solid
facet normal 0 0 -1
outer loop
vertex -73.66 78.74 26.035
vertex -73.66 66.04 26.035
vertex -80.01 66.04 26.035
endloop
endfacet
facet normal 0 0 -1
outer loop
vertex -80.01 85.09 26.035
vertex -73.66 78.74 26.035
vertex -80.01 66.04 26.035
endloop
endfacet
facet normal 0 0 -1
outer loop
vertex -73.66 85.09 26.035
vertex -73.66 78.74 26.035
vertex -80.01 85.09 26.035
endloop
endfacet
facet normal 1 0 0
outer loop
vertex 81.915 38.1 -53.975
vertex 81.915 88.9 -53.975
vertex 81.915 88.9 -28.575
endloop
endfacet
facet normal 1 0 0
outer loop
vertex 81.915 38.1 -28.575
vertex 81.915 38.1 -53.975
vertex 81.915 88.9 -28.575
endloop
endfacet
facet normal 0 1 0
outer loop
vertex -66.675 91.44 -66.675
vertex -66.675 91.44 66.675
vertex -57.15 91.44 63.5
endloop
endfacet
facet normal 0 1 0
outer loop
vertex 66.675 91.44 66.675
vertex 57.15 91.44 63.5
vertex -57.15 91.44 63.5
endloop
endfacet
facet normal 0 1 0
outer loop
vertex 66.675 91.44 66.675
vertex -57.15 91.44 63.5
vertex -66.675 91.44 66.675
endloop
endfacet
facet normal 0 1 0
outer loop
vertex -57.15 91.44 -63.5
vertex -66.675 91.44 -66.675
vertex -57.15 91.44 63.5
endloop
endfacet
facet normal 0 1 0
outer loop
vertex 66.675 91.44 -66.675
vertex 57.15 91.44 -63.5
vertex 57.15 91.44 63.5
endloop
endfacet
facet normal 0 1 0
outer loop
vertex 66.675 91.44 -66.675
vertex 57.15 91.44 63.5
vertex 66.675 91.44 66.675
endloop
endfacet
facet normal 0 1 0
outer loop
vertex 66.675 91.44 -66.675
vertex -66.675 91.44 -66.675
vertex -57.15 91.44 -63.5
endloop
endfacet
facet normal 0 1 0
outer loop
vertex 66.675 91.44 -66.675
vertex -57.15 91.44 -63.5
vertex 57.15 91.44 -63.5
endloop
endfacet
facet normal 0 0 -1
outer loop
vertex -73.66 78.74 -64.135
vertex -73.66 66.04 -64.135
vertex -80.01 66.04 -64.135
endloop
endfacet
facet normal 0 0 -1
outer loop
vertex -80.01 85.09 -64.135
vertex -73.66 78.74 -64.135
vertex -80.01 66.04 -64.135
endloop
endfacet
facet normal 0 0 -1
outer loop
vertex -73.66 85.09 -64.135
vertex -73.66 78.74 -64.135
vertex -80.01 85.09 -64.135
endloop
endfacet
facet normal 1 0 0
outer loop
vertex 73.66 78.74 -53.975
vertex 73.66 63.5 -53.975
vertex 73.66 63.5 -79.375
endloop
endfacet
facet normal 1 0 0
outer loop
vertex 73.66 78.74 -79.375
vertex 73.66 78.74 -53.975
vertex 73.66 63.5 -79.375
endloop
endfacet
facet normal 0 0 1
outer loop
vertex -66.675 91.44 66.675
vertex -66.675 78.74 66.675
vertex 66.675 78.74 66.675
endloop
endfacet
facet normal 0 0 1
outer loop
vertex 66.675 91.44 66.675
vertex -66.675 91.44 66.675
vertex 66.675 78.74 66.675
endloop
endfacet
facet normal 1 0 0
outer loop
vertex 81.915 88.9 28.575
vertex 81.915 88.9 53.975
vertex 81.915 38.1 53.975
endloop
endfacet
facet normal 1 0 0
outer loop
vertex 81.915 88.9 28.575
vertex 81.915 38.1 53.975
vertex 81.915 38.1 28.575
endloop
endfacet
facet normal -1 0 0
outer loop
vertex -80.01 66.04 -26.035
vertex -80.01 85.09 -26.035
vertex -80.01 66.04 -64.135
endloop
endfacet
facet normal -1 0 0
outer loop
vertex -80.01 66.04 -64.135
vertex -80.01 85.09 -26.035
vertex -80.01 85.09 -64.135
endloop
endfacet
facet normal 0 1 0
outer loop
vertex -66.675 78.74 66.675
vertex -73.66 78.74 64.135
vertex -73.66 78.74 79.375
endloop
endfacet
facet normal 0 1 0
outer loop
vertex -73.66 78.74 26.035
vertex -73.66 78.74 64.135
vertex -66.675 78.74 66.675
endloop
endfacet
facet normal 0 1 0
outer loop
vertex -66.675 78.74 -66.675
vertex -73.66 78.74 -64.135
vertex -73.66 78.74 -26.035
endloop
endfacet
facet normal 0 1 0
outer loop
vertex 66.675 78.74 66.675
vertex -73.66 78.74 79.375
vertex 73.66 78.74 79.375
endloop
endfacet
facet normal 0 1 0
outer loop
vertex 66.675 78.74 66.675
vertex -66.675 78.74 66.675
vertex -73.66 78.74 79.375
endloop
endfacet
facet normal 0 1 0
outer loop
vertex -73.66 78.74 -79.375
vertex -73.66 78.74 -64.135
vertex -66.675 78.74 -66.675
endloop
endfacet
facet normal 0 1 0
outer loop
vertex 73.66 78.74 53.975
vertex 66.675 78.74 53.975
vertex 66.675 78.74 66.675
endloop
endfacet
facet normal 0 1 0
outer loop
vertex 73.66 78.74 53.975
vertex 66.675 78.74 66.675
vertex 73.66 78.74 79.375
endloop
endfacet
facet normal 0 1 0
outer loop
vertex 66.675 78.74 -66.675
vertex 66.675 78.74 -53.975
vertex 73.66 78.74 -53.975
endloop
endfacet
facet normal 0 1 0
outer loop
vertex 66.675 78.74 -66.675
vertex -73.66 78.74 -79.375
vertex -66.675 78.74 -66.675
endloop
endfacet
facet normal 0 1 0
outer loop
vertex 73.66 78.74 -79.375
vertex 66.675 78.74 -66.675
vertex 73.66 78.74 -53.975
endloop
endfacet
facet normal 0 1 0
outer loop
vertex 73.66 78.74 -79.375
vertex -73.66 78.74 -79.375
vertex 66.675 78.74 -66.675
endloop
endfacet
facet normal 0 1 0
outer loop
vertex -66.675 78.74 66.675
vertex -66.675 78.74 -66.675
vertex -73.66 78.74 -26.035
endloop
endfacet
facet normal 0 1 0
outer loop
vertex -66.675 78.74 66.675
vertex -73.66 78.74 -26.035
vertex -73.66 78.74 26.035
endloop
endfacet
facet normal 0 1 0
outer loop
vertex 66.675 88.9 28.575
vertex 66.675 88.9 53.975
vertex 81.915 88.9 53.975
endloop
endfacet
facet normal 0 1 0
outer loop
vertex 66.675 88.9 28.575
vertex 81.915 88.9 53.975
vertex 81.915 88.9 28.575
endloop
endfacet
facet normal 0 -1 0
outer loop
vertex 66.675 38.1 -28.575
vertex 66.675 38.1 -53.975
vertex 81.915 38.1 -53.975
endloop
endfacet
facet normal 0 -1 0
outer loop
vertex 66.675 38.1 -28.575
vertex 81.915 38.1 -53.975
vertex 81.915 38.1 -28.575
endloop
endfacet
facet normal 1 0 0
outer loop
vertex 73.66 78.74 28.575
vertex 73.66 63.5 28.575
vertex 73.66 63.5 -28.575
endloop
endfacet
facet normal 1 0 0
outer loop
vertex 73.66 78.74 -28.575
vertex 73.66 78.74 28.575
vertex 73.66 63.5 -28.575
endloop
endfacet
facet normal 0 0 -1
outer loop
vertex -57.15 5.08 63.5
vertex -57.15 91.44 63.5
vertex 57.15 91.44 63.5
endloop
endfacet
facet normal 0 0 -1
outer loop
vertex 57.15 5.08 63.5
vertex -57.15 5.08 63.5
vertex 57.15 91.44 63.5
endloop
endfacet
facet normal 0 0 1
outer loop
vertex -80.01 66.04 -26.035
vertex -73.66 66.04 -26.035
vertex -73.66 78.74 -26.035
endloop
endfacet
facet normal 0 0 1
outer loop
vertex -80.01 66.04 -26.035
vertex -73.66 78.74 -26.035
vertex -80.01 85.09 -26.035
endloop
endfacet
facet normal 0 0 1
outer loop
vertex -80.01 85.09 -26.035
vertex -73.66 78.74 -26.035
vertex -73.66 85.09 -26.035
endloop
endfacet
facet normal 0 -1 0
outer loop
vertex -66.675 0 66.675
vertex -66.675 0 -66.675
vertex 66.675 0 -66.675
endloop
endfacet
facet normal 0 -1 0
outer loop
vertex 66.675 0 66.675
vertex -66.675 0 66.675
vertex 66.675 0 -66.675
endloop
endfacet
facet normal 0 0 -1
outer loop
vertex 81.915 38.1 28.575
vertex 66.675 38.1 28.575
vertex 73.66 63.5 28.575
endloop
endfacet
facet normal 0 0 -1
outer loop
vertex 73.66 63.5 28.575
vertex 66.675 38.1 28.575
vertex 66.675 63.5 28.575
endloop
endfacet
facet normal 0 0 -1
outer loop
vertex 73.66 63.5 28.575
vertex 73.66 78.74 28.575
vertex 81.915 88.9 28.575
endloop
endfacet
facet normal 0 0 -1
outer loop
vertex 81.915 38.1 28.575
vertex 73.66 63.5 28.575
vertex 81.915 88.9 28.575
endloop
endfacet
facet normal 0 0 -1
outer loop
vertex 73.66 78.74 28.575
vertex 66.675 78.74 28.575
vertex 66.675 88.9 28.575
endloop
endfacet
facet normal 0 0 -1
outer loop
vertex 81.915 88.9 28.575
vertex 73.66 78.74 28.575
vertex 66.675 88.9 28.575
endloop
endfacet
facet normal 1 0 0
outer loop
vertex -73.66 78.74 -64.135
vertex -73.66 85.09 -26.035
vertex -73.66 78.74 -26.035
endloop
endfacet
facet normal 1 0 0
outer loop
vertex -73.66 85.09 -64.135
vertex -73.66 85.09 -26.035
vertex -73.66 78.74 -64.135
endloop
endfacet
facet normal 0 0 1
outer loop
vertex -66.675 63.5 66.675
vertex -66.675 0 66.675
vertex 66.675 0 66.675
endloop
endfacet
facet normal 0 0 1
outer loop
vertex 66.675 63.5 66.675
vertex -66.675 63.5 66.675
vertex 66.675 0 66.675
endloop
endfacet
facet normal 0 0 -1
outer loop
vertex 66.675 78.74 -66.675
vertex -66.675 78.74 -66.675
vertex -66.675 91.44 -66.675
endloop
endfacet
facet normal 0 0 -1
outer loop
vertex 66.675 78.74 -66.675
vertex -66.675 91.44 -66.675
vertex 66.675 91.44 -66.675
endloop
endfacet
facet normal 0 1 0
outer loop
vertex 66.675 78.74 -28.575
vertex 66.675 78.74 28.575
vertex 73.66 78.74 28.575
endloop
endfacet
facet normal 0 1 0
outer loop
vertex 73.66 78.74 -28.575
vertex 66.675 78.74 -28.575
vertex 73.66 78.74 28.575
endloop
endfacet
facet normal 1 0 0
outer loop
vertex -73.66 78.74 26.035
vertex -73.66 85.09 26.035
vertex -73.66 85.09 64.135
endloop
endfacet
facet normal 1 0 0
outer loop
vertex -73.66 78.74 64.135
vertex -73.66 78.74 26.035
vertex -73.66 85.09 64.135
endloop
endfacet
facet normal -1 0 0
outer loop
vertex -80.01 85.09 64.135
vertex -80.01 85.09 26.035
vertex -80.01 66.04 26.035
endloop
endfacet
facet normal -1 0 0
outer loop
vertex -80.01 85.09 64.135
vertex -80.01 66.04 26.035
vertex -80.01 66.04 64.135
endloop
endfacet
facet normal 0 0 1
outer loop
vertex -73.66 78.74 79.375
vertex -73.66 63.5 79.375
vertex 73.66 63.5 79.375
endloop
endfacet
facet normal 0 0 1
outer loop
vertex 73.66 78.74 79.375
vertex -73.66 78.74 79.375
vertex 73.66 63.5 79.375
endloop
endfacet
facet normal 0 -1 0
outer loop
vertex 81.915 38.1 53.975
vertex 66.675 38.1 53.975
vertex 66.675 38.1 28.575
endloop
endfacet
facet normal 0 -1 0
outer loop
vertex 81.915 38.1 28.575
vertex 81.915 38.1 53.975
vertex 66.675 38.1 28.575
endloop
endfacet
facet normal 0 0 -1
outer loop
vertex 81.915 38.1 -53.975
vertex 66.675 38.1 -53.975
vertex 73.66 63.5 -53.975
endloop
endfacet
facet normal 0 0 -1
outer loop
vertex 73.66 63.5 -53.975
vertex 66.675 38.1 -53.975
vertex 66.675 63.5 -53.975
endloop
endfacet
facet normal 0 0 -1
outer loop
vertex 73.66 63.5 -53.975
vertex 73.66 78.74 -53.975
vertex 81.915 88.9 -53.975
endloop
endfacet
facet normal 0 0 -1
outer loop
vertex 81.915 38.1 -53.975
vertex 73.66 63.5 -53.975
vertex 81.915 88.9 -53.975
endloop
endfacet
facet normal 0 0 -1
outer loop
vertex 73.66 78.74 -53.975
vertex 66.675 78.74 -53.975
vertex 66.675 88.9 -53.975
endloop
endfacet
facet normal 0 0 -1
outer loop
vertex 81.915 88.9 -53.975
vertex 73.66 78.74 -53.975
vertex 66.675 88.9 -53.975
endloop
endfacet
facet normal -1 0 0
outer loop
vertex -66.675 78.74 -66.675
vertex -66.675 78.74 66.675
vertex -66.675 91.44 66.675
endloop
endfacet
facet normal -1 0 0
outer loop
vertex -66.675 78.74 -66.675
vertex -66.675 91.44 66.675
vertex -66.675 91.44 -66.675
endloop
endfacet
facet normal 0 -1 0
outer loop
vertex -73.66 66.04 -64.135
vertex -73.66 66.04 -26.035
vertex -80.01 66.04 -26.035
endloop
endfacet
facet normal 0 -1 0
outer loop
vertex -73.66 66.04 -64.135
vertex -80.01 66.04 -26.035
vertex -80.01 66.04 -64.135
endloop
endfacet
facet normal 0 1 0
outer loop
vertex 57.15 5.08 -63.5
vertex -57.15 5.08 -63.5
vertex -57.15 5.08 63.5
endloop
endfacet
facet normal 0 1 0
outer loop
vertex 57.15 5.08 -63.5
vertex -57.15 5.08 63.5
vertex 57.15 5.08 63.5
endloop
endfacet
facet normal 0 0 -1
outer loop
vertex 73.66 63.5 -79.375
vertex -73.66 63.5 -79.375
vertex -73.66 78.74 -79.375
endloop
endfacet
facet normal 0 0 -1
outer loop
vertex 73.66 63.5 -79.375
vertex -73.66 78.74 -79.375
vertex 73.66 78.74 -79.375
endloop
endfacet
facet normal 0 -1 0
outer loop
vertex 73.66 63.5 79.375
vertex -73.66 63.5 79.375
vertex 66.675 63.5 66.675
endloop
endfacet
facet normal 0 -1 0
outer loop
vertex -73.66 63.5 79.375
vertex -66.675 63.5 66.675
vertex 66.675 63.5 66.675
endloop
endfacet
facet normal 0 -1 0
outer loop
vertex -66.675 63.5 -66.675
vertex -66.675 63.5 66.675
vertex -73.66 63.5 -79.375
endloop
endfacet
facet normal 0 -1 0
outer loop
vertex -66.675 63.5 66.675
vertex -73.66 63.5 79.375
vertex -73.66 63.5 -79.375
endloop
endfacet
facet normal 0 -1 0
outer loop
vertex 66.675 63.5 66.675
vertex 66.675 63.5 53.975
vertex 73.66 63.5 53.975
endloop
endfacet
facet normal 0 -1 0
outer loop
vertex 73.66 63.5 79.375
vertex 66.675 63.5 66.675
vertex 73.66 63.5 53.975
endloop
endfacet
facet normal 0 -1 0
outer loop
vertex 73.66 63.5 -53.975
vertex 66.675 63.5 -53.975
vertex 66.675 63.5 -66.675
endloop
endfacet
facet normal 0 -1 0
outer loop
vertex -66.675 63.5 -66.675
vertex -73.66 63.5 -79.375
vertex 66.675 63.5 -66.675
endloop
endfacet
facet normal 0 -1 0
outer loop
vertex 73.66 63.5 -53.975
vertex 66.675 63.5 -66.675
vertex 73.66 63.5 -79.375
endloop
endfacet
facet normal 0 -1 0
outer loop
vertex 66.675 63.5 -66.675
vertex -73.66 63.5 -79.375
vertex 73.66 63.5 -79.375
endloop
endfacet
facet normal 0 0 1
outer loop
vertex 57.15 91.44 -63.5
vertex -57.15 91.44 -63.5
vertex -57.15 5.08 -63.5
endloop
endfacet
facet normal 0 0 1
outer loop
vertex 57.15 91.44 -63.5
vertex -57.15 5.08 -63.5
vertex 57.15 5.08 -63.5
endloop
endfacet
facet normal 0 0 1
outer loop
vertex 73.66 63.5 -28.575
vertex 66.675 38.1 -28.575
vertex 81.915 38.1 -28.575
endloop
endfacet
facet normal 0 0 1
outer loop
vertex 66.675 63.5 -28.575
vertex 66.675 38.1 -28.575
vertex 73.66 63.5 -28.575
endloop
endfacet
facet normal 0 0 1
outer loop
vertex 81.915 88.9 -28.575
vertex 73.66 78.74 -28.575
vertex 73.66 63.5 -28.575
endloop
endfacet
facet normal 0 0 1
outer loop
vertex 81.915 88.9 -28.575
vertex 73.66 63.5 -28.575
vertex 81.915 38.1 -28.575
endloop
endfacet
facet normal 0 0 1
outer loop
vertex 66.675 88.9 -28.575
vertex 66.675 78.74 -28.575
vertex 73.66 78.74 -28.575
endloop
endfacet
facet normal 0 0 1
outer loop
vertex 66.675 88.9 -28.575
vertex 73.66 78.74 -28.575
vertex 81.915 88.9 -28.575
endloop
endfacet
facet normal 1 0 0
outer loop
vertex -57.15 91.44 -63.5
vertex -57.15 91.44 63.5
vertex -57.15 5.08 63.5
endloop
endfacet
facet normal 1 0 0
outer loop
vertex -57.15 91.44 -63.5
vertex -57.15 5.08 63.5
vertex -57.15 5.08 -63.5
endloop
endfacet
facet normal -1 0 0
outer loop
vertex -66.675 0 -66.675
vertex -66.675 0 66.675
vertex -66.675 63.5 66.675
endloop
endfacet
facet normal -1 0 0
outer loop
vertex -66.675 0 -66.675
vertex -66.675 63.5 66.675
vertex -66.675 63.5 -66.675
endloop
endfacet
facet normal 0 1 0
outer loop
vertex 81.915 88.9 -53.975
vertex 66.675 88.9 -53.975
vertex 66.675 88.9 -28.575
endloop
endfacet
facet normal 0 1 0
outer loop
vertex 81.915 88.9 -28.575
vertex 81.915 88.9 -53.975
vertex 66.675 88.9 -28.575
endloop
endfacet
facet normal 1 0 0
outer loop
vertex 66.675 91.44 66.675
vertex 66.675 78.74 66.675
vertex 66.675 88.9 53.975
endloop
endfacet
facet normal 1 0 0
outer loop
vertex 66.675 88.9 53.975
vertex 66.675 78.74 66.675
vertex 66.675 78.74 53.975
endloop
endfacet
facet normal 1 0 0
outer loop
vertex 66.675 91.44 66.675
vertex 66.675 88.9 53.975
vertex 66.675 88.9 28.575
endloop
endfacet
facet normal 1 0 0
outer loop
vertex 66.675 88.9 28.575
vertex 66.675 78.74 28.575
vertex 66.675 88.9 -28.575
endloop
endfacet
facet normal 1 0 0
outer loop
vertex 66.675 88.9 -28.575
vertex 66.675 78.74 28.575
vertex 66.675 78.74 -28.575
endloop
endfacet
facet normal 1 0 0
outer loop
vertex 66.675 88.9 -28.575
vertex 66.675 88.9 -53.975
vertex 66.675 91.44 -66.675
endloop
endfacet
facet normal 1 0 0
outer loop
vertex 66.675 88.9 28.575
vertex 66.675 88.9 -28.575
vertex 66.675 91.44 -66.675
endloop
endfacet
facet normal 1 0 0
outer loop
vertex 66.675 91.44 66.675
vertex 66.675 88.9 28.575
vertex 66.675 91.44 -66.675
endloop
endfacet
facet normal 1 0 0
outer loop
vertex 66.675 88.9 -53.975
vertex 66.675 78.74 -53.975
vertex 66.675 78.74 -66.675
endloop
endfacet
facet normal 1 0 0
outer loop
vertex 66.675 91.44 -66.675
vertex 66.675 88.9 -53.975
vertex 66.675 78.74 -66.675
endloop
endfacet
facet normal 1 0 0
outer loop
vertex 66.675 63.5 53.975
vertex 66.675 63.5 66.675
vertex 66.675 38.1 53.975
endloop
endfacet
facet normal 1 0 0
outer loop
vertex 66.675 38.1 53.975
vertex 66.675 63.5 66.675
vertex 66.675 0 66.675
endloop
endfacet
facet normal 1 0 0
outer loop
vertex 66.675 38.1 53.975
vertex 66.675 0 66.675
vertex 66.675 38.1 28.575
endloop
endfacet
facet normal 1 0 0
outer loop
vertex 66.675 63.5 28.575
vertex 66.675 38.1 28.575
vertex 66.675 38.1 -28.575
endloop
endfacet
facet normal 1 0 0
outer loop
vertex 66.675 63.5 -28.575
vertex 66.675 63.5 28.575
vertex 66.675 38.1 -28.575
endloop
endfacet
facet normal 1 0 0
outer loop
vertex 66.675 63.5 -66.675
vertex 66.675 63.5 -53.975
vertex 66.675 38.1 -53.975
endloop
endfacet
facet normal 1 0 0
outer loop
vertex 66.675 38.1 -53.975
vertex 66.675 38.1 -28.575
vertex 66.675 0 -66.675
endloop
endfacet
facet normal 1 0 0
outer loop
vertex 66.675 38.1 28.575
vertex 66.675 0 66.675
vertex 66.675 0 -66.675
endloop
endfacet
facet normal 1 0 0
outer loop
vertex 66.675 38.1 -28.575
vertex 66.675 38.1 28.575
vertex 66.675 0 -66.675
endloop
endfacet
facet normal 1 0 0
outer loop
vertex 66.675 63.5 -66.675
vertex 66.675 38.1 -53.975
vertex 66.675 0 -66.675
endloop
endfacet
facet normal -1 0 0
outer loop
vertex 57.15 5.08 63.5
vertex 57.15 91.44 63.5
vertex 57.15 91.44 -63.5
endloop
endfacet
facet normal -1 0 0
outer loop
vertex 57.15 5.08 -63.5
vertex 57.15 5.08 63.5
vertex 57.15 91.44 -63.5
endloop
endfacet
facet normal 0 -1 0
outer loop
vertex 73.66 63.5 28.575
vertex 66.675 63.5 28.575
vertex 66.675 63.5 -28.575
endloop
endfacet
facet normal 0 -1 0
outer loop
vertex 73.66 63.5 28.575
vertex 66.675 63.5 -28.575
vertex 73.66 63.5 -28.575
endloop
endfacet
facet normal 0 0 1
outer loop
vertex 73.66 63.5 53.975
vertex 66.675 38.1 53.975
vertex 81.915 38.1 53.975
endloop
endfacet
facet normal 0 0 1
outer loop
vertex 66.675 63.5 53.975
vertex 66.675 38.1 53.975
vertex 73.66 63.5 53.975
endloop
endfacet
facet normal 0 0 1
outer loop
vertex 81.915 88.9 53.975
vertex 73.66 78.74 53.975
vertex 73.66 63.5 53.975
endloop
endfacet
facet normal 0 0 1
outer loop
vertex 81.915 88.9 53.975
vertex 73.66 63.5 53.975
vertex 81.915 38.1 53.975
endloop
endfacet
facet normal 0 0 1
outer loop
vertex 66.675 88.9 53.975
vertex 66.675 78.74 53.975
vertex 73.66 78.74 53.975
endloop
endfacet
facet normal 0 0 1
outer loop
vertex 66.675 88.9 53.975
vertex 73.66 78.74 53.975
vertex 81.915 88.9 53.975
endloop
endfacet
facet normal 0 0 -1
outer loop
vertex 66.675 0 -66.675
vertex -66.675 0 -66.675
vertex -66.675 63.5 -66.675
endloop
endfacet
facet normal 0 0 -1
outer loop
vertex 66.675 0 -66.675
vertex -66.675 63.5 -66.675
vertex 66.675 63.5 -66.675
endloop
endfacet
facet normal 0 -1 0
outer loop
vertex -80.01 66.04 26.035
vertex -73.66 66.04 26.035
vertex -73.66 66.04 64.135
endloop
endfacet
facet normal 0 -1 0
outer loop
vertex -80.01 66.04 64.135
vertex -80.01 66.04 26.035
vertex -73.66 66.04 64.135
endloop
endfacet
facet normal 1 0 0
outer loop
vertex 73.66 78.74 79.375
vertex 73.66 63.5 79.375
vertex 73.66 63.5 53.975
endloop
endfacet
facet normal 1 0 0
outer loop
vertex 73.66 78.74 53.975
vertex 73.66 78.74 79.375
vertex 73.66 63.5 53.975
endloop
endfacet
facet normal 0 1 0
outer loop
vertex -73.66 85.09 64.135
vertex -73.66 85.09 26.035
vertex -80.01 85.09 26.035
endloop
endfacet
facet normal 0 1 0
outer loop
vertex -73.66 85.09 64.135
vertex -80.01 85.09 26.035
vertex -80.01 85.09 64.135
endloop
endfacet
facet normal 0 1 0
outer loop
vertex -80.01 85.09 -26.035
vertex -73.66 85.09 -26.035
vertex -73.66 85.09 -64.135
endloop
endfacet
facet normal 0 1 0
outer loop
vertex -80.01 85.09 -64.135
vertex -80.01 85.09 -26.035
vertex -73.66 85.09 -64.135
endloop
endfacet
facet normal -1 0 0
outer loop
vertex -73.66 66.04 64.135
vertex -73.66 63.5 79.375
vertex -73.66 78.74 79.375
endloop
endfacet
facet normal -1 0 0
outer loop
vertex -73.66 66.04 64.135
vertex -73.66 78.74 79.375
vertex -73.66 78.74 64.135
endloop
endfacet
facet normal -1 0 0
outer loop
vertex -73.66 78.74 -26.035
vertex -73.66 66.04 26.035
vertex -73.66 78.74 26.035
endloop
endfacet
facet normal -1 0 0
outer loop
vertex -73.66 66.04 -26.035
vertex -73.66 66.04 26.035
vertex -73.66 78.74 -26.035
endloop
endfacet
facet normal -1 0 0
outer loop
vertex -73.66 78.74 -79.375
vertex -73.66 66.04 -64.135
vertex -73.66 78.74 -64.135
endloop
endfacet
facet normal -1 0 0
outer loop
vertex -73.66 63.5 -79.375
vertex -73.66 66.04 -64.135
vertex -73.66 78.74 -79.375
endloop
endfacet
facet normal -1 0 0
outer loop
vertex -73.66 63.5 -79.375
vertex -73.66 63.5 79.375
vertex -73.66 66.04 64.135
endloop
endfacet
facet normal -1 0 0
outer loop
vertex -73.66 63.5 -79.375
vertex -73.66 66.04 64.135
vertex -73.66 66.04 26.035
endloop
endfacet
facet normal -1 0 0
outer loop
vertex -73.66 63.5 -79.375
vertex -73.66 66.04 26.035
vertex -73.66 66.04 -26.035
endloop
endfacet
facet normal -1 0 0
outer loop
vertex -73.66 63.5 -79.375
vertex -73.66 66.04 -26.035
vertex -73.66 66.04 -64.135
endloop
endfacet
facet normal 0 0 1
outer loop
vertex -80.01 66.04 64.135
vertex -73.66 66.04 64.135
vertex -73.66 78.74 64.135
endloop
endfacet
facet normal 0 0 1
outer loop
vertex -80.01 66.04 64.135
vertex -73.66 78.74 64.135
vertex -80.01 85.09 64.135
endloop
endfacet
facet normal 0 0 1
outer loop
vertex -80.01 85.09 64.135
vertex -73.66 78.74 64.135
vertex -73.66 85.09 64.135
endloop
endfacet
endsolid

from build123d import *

# Parameters (mm, degrees)
SKETCH1_W           = 133.35
SKETCH1_H           = 133.35
BOSS_EXTRUDE1_DEPTH = 63.5
SKETCH2_W           = 147.32
SKETCH2_H           = 158.75
BOSS_EXTRUDE2_DEPTH = 15.24
SKETCH3_W           = 133.35
SKETCH3_H           = 133.35
BOSS_EXTRUDE3_DEPTH = 12.7
SKETCH4_W           = 38.1
SKETCH4_H           = 19.05
BOSS_EXTRUDE4_DEPTH = 6.35
SKETCH5_W           = 25.4
SKETCH5_H           = 50.8
BOSS_EXTRUDE5_DEPTH = 15.24
SKETCH7_W           = 114.3
SKETCH7_H           = 127
CUT_EXTRUDE1_DEPTH  = 86.36


with BuildPart() as part:
    # Sketch1 → Boss-Extrude1 (new body)
    with BuildSketch(Plane(origin=(0, 0, 0), x_dir=(1, 0, 0), z_dir=(0, 1, 0))):
        Rectangle(SKETCH1_W, SKETCH1_H)
    extrude(amount=BOSS_EXTRUDE1_DEPTH)

    # Sketch2 → Boss-Extrude2 (add)
    with BuildSketch(Plane(origin=(0, 63.5, 0), x_dir=(1, 0, 0), z_dir=(0, 1, 0))):
        Rectangle(SKETCH2_W, SKETCH2_H)
    extrude(amount=BOSS_EXTRUDE2_DEPTH)

    # Sketch3 → Boss-Extrude3 (add)
    with BuildSketch(Plane(origin=(0, 78.74, 0), x_dir=(1, 0, 0), z_dir=(0, 1, 0))):
        Rectangle(SKETCH3_W, SKETCH3_H)
    extrude(amount=BOSS_EXTRUDE3_DEPTH)

    # Sketch4 → Boss-Extrude4 (add)
    with BuildSketch(Plane.ZY.offset(73.66)):
        with Locations((45.085, 75.565)):
            Rectangle(SKETCH4_W, SKETCH4_H)
    boss_extrude4 = extrude(amount=BOSS_EXTRUDE4_DEPTH)

    # Mirror1: Boss-Extrude4 across plane
    add(boss_extrude4.mirror(Plane.XY))

    # Sketch5 → Boss-Extrude5 (add)
    with BuildSketch(Plane(origin=(66.675, 0, 0), x_dir=(0, 0, -1), z_dir=(1, 0, 0))):
        with Locations((-41.275, 63.5)):
            Rectangle(SKETCH5_W, SKETCH5_H)
    boss_extrude5 = extrude(amount=BOSS_EXTRUDE5_DEPTH)

    # Mirror2: Boss-Extrude5 across plane
    add(boss_extrude5.mirror(Plane.XY))

    # Sketch7 → Cut-Extrude1 (cut)
    with BuildSketch(Plane(origin=(0, 91.44, 0), x_dir=(1, 0, 0), z_dir=(0, 1, 0))):
        Rectangle(SKETCH7_W, SKETCH7_H)
    extrude(amount=-CUT_EXTRUDE1_DEPTH, mode=Mode.SUBTRACT)


solid = part.part
